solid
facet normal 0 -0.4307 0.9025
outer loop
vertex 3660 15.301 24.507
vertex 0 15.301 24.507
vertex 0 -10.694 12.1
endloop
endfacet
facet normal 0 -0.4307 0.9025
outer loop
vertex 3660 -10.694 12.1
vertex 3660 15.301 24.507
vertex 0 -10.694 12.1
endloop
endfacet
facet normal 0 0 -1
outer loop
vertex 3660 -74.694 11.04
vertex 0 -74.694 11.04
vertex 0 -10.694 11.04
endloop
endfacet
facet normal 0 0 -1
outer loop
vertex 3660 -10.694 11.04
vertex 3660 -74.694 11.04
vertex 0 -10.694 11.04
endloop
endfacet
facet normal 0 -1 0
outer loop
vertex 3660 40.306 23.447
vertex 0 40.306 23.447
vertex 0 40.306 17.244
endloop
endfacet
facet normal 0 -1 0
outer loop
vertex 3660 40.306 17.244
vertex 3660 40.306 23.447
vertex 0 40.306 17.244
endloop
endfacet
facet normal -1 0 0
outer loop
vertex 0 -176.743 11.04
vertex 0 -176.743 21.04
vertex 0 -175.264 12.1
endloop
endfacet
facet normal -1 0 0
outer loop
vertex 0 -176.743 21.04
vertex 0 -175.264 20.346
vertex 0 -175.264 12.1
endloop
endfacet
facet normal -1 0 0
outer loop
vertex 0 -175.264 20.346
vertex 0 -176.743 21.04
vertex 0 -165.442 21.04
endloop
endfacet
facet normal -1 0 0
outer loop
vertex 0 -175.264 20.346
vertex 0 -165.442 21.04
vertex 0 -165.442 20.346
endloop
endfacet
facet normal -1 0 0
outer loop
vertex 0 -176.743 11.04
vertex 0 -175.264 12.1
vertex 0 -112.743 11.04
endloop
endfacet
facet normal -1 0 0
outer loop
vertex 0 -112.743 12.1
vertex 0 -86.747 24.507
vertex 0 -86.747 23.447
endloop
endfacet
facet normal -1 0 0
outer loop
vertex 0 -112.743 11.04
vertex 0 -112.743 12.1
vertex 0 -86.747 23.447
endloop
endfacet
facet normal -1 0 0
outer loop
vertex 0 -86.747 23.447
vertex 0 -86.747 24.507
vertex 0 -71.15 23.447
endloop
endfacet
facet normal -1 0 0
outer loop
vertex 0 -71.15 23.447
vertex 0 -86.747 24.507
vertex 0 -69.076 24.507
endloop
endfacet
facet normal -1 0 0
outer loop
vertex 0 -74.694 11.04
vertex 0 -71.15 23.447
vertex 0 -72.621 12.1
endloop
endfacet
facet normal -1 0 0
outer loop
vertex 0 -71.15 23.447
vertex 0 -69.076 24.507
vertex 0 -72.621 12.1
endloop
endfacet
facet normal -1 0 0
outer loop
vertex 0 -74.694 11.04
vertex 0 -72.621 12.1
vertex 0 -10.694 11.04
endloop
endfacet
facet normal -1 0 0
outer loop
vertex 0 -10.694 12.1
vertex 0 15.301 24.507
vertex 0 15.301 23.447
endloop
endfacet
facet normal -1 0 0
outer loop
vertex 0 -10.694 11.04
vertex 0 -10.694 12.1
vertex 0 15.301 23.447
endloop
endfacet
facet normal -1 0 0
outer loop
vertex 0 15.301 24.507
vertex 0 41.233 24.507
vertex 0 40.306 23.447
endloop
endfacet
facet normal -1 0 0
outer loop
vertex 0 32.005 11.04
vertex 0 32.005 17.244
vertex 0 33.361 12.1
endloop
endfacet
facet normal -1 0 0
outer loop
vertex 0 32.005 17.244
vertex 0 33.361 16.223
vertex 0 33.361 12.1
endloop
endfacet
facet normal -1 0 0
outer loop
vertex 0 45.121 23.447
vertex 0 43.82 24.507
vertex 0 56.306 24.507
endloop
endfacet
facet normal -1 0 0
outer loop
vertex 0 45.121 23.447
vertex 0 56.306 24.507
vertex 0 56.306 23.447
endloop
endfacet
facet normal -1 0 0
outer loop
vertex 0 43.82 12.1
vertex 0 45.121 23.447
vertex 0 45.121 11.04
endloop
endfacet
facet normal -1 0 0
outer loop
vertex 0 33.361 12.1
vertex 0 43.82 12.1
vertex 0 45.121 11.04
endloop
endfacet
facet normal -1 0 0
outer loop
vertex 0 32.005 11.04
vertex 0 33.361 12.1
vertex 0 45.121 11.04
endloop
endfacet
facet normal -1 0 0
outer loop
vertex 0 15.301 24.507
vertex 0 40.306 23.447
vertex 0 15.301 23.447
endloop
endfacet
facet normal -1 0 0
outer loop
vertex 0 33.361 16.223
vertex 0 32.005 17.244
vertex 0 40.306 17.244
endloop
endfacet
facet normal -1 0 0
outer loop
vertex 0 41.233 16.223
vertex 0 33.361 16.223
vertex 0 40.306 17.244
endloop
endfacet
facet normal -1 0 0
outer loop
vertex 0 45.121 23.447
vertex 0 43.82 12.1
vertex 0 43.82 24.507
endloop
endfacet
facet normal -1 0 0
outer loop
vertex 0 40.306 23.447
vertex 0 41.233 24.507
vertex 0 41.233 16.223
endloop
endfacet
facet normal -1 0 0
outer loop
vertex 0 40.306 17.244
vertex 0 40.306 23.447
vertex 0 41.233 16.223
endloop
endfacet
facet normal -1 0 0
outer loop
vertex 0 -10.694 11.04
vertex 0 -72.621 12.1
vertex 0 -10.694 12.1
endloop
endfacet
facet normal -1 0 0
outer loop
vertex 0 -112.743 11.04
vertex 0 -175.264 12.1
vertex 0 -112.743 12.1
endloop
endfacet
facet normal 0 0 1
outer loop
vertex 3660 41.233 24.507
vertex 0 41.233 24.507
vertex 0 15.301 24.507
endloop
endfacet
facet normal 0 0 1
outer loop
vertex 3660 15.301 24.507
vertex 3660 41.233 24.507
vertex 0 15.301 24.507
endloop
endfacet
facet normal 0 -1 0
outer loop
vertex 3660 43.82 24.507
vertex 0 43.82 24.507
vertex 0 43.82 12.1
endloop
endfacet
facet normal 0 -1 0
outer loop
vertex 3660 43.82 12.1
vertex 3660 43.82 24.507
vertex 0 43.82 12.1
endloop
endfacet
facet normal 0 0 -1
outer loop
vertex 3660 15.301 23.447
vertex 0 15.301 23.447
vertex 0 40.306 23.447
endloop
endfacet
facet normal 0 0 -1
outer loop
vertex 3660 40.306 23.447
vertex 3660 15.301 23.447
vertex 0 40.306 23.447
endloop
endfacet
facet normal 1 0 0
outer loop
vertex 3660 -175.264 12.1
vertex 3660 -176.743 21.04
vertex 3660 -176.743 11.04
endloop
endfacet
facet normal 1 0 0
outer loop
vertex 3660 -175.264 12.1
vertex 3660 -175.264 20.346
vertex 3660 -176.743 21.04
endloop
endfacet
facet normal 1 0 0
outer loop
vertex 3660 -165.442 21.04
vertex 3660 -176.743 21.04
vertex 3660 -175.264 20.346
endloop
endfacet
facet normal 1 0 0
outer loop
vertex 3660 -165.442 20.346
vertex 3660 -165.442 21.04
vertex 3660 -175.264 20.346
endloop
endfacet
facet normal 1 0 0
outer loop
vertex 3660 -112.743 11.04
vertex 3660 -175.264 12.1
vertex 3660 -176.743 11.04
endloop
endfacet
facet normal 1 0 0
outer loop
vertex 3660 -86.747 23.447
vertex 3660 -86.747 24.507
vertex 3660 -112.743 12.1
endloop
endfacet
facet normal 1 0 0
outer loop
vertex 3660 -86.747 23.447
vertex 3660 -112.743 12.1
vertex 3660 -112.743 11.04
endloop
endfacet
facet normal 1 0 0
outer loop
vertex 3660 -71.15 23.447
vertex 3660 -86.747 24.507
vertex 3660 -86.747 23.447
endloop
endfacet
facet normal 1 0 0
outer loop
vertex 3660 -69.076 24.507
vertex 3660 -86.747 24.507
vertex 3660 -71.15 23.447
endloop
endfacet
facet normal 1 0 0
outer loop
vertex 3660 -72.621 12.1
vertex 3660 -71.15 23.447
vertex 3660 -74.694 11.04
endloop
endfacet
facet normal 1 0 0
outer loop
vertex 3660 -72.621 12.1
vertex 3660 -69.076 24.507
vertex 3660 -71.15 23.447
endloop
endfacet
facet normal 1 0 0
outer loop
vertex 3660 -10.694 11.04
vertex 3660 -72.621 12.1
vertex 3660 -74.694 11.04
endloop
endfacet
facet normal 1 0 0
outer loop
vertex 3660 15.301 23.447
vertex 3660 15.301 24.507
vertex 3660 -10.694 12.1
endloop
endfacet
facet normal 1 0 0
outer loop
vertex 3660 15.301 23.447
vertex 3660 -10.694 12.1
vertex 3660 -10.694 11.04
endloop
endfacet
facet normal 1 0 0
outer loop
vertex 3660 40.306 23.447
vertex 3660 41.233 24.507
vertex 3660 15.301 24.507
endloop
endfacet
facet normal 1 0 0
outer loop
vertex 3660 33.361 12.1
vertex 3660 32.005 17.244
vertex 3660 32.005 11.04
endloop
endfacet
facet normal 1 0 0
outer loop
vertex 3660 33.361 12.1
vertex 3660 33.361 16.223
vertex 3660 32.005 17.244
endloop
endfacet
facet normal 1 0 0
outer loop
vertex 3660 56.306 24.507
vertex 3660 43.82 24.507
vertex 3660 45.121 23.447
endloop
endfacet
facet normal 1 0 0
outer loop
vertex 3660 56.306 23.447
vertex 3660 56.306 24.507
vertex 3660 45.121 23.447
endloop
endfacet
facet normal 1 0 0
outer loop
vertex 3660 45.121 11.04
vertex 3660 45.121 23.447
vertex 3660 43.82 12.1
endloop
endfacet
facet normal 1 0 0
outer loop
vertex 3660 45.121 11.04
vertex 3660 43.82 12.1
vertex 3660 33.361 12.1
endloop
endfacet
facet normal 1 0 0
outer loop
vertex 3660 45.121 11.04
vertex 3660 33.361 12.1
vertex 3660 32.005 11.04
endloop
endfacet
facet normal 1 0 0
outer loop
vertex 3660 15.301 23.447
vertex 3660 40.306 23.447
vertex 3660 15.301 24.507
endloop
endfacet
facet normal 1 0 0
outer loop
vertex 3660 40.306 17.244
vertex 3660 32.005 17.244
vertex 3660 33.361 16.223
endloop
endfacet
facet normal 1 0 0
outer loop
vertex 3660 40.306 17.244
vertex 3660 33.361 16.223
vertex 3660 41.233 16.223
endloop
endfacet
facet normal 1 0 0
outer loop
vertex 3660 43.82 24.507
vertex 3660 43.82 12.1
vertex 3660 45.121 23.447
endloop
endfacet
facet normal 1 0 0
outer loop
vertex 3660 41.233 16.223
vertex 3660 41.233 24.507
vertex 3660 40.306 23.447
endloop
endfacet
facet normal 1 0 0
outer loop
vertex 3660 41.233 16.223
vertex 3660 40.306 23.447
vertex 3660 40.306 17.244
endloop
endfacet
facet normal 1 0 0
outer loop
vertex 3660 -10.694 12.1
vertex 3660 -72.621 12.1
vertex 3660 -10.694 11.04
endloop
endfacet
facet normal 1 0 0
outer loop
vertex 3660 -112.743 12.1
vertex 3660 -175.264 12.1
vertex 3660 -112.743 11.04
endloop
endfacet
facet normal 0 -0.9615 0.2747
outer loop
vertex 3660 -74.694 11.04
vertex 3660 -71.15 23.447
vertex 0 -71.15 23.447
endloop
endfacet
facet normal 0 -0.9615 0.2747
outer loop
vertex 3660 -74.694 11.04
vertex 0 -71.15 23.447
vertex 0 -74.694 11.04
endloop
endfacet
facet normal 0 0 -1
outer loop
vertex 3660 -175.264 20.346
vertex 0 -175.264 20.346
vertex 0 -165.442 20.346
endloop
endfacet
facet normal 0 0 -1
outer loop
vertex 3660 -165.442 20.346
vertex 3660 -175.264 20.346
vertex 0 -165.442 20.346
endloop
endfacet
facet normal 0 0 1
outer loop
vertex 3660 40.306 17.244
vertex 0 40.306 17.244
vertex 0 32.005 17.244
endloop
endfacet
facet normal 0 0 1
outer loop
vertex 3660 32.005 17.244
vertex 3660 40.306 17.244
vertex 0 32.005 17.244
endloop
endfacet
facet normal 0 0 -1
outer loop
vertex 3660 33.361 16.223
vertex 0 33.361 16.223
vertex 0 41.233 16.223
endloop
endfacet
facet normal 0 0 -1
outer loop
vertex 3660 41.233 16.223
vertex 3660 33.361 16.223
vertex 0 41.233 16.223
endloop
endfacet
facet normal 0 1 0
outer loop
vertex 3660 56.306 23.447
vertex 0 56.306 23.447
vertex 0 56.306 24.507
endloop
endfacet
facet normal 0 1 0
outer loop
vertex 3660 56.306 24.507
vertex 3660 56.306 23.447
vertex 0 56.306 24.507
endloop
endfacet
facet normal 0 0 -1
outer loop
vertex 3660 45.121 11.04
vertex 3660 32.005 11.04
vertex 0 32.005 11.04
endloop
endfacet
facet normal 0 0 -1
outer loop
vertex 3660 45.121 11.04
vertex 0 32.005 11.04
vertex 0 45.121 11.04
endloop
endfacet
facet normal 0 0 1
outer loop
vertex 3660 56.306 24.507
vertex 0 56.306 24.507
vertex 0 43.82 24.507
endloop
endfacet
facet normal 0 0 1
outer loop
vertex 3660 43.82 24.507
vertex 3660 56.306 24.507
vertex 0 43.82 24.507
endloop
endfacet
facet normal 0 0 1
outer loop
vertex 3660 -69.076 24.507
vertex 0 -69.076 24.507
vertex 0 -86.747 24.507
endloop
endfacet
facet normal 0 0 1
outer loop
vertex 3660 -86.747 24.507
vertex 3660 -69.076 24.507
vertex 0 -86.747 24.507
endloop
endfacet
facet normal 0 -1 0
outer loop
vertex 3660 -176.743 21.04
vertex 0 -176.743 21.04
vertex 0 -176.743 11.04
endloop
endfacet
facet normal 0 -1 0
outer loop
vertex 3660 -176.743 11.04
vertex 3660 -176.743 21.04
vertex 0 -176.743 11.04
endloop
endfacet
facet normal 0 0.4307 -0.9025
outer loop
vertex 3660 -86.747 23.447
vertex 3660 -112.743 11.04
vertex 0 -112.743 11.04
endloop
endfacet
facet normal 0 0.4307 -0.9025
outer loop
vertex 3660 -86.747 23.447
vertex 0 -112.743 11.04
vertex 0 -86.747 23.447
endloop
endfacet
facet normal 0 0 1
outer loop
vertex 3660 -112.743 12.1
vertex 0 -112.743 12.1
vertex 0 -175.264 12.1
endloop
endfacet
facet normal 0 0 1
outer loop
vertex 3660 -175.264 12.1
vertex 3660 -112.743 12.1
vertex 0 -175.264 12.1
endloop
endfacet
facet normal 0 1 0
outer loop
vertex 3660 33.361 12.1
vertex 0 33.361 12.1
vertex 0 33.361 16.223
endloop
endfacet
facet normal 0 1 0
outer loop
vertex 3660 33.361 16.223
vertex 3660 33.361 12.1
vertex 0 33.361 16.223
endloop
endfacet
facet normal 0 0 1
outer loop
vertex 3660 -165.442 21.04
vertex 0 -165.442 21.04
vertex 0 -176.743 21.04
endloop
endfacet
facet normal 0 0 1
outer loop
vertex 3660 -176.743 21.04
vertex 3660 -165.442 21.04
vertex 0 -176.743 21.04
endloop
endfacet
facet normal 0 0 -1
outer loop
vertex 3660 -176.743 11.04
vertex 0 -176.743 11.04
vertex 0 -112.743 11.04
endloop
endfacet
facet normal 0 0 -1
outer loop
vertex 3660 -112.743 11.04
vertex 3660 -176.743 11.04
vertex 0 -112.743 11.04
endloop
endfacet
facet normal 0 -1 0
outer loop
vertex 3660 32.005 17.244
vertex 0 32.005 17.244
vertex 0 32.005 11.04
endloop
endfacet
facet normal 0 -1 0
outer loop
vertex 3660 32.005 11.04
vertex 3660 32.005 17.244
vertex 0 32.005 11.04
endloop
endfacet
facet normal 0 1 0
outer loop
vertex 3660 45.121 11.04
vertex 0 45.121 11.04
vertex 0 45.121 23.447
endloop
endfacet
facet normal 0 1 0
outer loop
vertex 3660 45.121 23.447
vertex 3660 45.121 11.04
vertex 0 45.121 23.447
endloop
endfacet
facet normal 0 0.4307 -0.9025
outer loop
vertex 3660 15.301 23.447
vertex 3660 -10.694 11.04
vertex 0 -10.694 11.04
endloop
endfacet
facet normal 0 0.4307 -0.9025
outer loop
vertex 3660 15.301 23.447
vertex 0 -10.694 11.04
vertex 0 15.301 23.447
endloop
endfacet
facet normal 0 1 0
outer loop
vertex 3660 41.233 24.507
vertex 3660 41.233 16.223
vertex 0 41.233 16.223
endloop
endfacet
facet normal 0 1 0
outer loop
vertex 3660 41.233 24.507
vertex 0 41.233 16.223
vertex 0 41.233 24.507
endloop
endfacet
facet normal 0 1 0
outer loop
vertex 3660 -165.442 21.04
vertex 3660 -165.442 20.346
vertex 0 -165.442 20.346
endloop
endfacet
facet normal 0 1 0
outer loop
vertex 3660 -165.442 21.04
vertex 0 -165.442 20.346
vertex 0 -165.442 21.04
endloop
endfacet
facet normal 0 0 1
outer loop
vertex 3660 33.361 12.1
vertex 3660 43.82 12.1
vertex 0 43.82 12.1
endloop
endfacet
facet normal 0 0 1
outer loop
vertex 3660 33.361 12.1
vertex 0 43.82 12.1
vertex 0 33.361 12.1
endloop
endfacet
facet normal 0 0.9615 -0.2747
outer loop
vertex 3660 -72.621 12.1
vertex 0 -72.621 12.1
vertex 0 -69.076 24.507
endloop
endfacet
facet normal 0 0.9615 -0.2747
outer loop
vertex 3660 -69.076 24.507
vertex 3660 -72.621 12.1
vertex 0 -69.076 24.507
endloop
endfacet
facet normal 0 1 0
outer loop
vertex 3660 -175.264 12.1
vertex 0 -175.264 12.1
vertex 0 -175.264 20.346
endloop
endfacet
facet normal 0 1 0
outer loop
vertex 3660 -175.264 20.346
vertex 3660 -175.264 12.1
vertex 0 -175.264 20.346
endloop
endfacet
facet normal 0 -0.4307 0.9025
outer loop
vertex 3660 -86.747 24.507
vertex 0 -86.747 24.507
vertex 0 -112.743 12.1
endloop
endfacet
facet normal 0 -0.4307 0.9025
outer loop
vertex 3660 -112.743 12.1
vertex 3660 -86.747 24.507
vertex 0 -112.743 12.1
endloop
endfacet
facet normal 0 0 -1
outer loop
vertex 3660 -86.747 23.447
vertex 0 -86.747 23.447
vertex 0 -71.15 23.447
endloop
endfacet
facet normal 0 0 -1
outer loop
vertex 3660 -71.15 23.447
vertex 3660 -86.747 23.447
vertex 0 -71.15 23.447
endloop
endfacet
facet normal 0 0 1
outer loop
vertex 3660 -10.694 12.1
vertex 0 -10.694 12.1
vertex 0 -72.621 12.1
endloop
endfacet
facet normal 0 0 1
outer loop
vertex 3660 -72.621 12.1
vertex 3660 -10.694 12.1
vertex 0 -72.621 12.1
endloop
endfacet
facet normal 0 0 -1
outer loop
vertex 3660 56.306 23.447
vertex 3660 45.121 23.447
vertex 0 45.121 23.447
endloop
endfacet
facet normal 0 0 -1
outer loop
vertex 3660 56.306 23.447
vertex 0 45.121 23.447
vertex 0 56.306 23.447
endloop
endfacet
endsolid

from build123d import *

# Parameters (mm, degrees)
EXTRUDE_1_DEPTH = 3660


with BuildPart() as part:
    # Эскиз1 → Бобышка-Вытянуть1 (new body)
    with BuildSketch(Plane(origin=(0, 0, 0), x_dir=(0, 0, -1), z_dir=(1, 0, 0))):
        Polygon((-21.04046283, -176.74277017), (-11.04046283, -176.74277017), (-11.04046283, -112.74277017), (-23.447393592, -86.746885797), (-23.447393592, -71.14960141), (-11.04046283, -74.694438771), (-11.04046283, -10.694438771), (-23.447393592, 15.301445602), (-23.447393592, 40.305561229), (-17.243928211, 40.305561229), (-17.243928211, 32.005165785), (-11.04046283, 32.005165785), (-11.04046283, 45.121064019), (-23.447393592, 45.121064019), (-23.447393592, 56.305561229), (-24.507119661, 56.305561229), (-24.507119661, 43.820437884), (-12.100188898, 43.820437884), (-12.100188898, 33.361087922), (-16.2229249, 33.361087922), (-16.2229249, 41.232557481), (-24.507119661, 41.232557481), (-24.507119661, 15.301445602), (-12.100188898, -10.694438771), (-12.100188898, -72.620716315), (-24.507119661, -69.075878954), (-24.507119661, -86.746885797), (-12.100188898, -112.74277017), (-12.100188898, -175.263961293), (-20.345660902, -175.263961293), (-20.345660902, -165.442275203), (-21.04046283, -165.442275203), align=None)
    extrude(amount=EXTRUDE_1_DEPTH)


solid = part.part
